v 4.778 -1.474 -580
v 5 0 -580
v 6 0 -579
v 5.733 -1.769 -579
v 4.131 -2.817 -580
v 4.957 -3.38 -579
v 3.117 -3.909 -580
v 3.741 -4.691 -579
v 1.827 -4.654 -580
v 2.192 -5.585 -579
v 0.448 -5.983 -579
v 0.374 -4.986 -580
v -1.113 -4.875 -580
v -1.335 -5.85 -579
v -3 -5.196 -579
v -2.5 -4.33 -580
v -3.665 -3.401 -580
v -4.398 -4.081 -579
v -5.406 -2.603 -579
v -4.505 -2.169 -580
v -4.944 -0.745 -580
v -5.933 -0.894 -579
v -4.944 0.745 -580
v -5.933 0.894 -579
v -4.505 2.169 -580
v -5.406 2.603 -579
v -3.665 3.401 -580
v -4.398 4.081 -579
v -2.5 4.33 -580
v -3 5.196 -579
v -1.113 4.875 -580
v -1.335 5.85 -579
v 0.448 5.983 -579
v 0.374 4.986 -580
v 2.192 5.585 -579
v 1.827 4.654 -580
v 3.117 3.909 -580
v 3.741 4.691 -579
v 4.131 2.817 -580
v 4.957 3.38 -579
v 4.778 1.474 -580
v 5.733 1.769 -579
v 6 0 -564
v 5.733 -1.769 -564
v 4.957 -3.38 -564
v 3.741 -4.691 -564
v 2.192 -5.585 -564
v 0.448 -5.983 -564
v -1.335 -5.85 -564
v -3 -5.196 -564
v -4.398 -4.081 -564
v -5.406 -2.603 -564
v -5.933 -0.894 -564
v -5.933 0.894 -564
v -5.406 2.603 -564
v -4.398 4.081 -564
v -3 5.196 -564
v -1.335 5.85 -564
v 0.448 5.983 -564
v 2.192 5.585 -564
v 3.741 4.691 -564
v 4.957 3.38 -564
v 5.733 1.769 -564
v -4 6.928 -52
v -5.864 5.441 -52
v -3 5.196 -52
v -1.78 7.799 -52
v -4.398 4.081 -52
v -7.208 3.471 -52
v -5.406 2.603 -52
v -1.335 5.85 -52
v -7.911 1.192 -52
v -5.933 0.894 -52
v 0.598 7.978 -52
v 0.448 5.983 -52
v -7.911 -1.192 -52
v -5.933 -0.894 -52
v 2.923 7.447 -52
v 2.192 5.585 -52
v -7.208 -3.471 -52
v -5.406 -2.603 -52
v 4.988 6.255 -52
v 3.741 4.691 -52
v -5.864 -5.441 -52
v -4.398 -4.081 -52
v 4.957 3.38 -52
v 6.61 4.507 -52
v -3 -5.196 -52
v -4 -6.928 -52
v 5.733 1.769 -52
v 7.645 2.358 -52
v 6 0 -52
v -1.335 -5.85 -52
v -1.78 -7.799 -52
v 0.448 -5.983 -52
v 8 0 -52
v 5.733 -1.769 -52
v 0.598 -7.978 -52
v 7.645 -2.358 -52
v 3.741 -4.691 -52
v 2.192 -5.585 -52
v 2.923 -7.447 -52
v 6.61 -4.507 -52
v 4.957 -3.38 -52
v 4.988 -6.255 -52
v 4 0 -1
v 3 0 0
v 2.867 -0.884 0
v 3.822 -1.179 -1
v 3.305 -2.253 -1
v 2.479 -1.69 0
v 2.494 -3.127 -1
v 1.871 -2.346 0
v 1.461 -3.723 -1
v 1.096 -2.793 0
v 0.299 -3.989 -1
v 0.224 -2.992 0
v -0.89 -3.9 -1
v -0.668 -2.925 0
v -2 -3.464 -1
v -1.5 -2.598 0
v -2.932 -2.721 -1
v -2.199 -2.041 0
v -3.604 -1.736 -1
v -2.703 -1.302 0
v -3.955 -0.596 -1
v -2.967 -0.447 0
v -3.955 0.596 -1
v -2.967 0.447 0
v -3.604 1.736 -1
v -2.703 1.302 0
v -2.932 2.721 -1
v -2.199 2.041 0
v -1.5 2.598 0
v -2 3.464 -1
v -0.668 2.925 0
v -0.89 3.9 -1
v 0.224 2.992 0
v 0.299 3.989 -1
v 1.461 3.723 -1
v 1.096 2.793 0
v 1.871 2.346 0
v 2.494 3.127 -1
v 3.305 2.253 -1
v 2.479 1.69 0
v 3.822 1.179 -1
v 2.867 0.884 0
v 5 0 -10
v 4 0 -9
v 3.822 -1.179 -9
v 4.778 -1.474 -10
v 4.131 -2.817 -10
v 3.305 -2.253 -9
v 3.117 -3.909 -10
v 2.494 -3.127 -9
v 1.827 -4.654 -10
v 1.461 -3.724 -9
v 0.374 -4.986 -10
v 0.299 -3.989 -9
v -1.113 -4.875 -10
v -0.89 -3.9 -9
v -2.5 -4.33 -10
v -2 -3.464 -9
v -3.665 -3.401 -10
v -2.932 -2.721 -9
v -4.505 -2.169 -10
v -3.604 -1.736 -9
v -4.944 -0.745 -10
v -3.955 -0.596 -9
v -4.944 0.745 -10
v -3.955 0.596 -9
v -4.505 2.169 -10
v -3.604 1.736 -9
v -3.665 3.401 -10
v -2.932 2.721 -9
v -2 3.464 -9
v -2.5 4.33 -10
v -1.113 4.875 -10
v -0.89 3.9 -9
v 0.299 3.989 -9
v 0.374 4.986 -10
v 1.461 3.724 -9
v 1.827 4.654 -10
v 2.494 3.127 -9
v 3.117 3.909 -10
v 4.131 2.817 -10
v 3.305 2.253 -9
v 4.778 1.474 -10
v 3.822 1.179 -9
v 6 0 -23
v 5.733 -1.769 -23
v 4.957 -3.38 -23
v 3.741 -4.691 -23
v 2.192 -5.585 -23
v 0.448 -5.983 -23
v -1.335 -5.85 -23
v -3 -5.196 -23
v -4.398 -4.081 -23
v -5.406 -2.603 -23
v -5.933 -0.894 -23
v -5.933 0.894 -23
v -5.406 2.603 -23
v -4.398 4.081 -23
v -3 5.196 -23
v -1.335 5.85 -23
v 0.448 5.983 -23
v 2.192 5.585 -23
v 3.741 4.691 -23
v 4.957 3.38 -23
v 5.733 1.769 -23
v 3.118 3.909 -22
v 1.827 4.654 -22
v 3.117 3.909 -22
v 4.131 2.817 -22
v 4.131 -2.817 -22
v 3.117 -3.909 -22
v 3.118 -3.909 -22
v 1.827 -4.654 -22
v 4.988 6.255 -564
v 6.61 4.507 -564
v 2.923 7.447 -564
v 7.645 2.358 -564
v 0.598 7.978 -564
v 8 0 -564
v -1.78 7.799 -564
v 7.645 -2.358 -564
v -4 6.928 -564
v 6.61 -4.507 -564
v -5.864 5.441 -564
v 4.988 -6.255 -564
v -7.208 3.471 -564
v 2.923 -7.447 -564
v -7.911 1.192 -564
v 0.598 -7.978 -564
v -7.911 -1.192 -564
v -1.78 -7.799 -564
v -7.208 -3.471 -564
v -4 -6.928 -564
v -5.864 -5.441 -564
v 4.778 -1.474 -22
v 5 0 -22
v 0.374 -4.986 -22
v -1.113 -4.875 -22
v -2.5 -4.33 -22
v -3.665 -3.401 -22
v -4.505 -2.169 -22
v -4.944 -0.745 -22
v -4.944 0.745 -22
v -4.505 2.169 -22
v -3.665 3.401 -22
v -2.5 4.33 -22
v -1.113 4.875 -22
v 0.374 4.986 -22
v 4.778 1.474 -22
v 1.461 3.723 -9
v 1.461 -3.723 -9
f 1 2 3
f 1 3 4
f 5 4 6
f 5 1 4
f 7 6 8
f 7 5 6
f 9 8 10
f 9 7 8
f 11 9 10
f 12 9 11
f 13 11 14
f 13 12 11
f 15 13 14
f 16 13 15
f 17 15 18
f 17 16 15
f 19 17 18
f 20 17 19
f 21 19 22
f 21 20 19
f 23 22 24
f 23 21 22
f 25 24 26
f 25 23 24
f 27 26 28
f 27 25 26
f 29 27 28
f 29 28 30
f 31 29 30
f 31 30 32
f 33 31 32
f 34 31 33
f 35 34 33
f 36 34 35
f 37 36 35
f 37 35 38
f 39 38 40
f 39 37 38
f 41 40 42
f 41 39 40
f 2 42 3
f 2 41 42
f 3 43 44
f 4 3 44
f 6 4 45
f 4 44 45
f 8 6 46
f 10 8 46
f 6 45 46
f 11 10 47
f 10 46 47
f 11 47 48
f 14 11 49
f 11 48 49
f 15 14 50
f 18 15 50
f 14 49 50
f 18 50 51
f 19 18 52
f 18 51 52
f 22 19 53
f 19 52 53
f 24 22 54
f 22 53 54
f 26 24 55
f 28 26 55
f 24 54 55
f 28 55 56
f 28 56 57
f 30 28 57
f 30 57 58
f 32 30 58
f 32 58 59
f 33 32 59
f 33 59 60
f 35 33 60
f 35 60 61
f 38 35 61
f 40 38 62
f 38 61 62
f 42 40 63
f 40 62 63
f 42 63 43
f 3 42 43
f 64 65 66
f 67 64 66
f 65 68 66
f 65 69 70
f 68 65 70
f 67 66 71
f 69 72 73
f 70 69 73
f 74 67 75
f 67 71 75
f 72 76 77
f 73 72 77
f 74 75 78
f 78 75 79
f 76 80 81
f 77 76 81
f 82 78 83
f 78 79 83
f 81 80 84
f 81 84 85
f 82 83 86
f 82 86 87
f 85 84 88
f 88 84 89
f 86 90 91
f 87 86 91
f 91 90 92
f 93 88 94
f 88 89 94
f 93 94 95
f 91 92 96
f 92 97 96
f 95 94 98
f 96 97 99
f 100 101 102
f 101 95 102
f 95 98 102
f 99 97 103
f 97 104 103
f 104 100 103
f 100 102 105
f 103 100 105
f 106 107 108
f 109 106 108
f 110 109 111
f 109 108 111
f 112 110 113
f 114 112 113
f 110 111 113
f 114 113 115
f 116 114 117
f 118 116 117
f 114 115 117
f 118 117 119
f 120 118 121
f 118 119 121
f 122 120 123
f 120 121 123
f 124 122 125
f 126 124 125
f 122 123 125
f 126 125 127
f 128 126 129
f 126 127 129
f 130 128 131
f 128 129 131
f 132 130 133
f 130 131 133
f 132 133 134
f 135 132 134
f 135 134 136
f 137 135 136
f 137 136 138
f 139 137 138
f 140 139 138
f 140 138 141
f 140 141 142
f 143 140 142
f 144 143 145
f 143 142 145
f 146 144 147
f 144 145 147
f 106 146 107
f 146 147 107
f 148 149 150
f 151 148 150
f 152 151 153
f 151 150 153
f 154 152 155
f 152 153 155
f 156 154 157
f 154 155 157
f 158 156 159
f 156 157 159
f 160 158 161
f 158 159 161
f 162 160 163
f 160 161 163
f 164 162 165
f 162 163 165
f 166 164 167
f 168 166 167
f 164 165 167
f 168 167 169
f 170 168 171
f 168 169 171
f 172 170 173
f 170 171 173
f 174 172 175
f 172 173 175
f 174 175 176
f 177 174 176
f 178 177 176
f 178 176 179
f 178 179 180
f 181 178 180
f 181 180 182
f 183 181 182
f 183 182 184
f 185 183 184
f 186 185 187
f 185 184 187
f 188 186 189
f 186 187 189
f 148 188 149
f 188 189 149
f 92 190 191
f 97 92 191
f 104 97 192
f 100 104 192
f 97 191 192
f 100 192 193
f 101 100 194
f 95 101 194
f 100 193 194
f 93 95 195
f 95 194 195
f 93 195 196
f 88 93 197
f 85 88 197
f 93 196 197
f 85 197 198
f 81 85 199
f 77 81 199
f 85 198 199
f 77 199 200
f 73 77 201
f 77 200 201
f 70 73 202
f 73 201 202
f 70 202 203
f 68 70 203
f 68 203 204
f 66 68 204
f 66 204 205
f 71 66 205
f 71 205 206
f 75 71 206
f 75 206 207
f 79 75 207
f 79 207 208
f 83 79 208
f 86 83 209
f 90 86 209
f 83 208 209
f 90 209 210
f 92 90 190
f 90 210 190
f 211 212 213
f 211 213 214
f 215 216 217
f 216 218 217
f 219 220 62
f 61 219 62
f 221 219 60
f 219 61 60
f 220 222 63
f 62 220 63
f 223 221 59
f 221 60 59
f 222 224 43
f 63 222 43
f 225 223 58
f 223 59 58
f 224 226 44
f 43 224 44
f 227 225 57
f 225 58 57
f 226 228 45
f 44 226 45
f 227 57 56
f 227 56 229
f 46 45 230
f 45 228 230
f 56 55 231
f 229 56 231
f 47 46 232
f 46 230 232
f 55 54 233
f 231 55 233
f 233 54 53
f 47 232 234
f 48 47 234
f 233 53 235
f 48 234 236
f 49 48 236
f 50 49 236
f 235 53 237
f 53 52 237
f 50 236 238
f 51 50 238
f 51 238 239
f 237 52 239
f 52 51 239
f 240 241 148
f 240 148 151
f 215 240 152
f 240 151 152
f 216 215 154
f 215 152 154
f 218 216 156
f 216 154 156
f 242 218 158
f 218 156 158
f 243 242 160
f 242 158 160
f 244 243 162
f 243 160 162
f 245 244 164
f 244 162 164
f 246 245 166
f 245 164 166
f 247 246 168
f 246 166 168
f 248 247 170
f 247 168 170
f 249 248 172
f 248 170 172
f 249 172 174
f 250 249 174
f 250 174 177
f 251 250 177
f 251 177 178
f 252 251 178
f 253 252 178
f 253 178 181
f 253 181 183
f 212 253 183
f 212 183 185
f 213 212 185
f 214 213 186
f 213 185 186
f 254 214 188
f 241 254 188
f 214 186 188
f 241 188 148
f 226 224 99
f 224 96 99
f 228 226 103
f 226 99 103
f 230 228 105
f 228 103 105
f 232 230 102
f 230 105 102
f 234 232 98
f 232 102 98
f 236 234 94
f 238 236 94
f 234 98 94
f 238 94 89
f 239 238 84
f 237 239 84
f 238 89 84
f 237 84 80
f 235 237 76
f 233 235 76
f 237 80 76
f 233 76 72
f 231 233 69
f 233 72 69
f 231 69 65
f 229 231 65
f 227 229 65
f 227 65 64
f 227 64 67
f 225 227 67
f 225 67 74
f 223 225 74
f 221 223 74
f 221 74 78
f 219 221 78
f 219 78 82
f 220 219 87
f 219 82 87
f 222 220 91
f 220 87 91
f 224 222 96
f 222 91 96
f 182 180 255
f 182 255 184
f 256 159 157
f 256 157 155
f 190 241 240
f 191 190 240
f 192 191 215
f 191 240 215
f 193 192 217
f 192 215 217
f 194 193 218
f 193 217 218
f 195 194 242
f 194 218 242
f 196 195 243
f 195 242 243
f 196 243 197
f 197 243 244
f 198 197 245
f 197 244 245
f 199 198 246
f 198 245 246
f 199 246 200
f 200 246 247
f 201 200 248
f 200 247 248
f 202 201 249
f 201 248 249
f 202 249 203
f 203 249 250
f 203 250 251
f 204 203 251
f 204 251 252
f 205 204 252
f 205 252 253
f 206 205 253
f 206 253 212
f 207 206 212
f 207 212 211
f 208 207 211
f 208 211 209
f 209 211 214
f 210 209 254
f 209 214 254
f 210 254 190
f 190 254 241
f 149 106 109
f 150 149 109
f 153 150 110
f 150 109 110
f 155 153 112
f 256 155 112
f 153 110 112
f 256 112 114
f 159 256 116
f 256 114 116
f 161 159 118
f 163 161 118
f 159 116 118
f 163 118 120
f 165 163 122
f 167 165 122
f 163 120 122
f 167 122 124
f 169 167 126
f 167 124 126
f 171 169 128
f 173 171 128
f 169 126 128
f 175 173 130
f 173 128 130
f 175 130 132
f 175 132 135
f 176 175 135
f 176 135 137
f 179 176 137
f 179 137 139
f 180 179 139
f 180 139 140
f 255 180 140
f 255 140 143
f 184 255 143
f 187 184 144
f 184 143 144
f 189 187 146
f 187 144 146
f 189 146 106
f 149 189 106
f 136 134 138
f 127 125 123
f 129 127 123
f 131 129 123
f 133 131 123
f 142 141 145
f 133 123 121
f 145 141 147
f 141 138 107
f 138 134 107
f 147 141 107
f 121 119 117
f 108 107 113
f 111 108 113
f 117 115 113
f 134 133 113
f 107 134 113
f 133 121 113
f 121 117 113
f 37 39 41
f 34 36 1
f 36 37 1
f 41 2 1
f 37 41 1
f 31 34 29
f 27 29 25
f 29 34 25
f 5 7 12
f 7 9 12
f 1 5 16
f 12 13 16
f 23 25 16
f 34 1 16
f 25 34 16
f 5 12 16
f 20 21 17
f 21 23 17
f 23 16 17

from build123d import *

# Parameters (mm, degrees)
SFAZOWANIE1_SIZE = 1
SFAZOWANIE2_SIZE = 1


with BuildPart() as part:
    # Szkic1 → Obrót1 (revolve)
    with BuildSketch(Plane(origin=(0, 0, 0), x_dir=(0, 0, -1), z_dir=(1, 0, 0)), mode=Mode.PRIVATE) as obr_t1_sk:
        Polygon((0, 0), (580, 0), (580, 6), (564, 6), (564, 8), (52, 8), (52, 6), (22, 6), (22, 5), (9, 5), (9, 4), (0, 4), align=None)
    revolve(obr_t1_sk.sketch.rotate(Axis((0, 0, 0), (0, 0, -1)), 90), axis=Axis((0, 0, 0), (0, 0, -1)))

    # Sfazowanie1
    sfazowanie1_edges = [part.edges().sort_by_distance(p)[0] for p in [
        (-6, 0, -22),
        (-4, 0, 0),
        (-5, 0, -9),
    ]]
    chamfer(sfazowanie1_edges, length=SFAZOWANIE1_SIZE - 0.0001)  # a hair under: the kernel refuses the full size

    # Sfazowanie2
    sfazowanie2_edges = [part.edges().sort_by_distance(p)[0] for p in [
        (-6, 0, -580),
    ]]
    chamfer(sfazowanie2_edges, length=SFAZOWANIE2_SIZE)


solid = part.part
